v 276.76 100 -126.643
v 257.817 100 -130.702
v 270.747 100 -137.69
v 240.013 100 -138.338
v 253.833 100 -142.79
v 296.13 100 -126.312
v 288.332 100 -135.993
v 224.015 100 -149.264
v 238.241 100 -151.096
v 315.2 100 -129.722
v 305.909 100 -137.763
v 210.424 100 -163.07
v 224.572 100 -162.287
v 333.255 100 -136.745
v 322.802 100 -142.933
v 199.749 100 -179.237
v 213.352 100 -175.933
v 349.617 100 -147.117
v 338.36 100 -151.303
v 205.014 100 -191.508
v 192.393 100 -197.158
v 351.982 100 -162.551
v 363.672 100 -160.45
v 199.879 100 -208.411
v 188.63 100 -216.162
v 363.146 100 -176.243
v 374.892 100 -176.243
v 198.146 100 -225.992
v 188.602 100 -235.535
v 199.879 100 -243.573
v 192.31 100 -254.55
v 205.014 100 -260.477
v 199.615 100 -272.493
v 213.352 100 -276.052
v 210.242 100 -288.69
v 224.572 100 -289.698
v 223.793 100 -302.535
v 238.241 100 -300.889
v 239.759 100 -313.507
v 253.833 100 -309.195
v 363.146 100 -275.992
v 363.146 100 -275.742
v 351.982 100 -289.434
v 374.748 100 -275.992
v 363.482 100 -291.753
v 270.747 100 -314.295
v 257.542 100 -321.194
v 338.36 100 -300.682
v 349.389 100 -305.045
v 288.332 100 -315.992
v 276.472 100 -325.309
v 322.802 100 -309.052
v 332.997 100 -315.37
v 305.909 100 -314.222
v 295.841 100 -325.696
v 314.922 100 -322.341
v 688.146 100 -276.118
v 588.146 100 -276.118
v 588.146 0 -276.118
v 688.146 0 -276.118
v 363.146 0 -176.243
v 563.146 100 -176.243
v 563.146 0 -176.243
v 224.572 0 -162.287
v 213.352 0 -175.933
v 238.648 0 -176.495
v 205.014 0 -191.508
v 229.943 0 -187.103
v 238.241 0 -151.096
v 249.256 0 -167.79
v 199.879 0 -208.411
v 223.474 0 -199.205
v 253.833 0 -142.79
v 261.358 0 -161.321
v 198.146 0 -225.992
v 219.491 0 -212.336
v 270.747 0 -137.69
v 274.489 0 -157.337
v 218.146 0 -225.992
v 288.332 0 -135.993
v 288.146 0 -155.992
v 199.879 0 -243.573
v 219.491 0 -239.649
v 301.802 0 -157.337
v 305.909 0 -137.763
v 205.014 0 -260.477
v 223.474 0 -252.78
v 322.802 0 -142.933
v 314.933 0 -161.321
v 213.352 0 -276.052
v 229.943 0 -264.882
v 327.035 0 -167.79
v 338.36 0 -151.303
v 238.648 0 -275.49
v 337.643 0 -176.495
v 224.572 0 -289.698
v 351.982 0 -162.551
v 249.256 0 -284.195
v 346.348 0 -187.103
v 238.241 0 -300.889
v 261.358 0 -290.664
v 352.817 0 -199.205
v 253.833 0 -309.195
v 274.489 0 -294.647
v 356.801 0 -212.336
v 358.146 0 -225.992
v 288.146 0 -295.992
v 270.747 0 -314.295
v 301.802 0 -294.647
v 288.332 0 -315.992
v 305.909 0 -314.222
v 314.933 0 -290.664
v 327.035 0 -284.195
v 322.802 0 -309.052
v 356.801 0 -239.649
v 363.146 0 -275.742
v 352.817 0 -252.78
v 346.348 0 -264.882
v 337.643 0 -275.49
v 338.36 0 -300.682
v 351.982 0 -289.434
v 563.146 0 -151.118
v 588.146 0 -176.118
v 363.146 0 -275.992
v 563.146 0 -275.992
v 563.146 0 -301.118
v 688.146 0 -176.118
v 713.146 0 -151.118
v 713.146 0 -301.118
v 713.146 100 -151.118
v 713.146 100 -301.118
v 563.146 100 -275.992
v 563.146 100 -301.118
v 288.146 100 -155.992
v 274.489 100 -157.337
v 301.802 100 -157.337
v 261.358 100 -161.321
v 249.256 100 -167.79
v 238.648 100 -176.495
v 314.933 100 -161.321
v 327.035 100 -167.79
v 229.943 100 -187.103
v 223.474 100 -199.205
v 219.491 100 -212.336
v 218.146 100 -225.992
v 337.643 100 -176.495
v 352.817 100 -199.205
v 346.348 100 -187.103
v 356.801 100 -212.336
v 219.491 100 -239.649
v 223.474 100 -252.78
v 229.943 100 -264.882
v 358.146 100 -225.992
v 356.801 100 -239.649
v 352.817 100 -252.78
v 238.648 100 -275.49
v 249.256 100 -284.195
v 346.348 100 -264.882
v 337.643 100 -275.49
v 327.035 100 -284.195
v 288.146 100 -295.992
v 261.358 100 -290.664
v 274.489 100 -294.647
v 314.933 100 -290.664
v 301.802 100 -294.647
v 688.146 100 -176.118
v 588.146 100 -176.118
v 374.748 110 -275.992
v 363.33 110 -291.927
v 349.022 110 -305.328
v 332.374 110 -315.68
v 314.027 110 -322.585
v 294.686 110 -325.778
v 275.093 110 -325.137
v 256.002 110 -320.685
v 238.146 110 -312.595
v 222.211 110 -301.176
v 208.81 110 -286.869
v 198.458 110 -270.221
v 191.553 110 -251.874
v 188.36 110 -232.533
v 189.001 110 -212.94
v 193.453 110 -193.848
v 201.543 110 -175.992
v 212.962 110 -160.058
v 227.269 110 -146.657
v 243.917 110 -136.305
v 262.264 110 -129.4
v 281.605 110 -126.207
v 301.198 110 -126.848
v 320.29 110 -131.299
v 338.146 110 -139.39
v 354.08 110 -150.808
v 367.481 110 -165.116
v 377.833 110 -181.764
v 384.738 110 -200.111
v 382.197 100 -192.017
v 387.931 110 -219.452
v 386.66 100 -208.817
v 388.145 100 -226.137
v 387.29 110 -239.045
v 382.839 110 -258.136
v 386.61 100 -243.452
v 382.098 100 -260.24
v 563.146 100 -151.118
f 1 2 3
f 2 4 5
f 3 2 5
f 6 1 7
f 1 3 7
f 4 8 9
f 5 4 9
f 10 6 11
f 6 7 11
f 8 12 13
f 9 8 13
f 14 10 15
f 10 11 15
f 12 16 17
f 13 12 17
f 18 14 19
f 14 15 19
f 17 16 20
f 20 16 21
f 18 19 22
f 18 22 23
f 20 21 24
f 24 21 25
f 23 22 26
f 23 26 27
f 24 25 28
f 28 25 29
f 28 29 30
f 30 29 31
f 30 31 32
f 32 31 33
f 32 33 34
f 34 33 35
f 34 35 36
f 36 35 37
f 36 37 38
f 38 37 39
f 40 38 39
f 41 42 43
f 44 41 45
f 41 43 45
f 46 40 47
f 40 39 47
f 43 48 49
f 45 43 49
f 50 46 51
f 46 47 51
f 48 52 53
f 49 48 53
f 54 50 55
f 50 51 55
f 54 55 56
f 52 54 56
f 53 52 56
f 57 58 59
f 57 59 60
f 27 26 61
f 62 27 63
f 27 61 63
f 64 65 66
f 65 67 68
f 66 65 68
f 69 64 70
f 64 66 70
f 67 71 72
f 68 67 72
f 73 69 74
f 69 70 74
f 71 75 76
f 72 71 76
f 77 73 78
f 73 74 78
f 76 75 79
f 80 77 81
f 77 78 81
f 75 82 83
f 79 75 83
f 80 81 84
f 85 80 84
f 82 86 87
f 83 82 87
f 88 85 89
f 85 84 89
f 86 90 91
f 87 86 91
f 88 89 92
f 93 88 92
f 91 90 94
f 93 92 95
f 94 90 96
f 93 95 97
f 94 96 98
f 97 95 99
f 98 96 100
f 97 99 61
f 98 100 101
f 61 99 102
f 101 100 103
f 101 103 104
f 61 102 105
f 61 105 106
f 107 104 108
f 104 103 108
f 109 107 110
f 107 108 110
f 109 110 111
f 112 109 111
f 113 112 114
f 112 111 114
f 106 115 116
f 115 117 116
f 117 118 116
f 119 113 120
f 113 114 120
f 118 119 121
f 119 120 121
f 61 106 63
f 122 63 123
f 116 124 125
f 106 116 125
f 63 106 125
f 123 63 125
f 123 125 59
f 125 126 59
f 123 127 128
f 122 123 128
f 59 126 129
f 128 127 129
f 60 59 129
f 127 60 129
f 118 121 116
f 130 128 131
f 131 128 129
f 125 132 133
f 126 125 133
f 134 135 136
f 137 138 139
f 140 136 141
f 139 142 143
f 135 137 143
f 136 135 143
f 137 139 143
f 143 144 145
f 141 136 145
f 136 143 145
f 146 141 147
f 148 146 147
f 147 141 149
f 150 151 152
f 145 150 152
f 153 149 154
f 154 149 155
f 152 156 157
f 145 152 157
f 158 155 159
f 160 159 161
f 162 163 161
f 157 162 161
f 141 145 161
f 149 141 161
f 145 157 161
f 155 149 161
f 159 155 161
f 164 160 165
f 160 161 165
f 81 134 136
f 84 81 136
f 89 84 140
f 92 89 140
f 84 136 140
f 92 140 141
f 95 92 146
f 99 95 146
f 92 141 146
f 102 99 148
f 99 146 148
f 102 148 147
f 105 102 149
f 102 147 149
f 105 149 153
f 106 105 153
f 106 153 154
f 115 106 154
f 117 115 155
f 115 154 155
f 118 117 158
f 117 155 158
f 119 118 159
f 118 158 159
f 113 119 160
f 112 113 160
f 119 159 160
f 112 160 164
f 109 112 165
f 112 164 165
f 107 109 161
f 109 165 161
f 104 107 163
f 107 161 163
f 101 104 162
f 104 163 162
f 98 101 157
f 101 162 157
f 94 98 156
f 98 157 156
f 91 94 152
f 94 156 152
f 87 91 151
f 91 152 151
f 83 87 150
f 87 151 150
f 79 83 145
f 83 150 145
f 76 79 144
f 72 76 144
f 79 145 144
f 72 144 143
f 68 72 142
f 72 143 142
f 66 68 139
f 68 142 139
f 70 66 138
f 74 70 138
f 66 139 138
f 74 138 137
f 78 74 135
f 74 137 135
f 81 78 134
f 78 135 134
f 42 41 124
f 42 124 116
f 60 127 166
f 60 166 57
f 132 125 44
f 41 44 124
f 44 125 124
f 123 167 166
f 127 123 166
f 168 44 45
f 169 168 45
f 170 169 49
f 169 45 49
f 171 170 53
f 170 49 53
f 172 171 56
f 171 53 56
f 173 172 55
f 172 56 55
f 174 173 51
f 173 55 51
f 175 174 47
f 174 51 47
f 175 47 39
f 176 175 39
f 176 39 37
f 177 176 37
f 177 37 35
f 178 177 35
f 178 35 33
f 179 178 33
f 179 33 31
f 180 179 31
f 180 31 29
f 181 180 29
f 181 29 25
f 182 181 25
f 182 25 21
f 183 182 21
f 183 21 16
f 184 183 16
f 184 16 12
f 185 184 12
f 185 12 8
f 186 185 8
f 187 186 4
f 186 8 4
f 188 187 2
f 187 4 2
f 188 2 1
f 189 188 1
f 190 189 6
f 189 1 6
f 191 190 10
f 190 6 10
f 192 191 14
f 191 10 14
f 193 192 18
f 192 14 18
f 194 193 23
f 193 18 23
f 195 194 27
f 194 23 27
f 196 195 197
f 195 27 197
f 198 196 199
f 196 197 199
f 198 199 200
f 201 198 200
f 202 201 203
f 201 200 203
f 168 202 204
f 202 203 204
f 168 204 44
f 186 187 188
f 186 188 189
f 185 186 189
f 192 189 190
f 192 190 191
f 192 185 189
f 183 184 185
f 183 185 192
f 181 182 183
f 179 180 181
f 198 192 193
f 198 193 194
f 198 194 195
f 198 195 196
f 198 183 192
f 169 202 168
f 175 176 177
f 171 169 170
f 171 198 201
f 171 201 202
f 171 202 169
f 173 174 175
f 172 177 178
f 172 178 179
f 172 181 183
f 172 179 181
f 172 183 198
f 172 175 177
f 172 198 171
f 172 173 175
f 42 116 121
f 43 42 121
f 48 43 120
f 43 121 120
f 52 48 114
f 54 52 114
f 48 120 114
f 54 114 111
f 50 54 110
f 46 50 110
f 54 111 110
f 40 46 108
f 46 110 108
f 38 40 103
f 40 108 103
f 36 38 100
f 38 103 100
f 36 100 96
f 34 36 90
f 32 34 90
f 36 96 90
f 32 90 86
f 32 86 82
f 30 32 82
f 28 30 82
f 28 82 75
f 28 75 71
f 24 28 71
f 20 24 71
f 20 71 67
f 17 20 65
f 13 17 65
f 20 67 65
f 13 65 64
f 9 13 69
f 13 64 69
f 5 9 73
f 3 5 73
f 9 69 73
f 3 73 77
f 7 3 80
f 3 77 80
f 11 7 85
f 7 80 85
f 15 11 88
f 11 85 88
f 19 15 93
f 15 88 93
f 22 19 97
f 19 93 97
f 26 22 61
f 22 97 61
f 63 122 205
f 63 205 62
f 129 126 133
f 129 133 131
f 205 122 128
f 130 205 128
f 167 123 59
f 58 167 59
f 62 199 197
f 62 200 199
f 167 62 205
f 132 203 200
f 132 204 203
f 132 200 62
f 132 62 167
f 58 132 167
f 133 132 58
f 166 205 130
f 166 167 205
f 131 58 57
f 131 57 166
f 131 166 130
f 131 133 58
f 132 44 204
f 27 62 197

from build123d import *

# Parameters (mm, degrees)
SKETCH1_W           = 150
SKETCH1_H           = 150
BOSS_EXTRUDE1_DEPTH = 100
SKETCH5_R           = 70
CUT_EXTRUDE2_DEPTH  = 100
SKETCH6_R           = 100
BOSS_EXTRUDE4_DEPTH = 10
SKETCH7_W           = 100
SKETCH7_H           = 100
CUT_EXTRUDE3_DEPTH  = 100


with BuildPart() as part:
    # Sketch1 → Boss-Extrude1 (new body)
    with BuildSketch(Plane(origin=(0, 0, 0), x_dir=(1, 0, 0), z_dir=(0, 1, 0))):
        with BuildLine():
            Line((363.145565834, 275.992438563), (363.145565834, 275.741810419))
            ThreePointArc((363.145565834, 275.741810419), (198.145565834, 225.992438563), (363.145565834, 176.243066708))
            Line((363.145565834, 176.243066708), (563.145565834, 176.243066708))
            Line((563.145565834, 176.243066708), (563.145565834, 275.741810419))
            Line((563.145565834, 275.741810419), (563.145565834, 275.992438563))
            Line((563.145565834, 275.992438563), (363.145565834, 275.992438563))
        make_face()
        with Locations((638.145565834, 226.117752636)):
            Rectangle(SKETCH1_W, SKETCH1_H)
    extrude(amount=BOSS_EXTRUDE1_DEPTH)

    # Sketch5 → Cut-Extrude2 (cut)
    with BuildSketch(Plane(origin=(0, 100, 0), x_dir=(1, 0, 0), z_dir=(0, 1, 0))):
        with Locations(Location((288.145565834, 225.992438563, 0), (0, 0, 270))):
            Circle(SKETCH5_R)
    extrude(amount=-CUT_EXTRUDE2_DEPTH, mode=Mode.SUBTRACT)

    # Sketch6 → Boss-Extrude4 (add)
    with BuildSketch(Plane(origin=(0, 100, 0), x_dir=(1, 0, 0), z_dir=(0, 1, 0))):
        with Locations(Location((288.145565834, 225.992438563, 0), (0, 0, 30))):
            Circle(SKETCH6_R)
    extrude(amount=BOSS_EXTRUDE4_DEPTH)

    # Sketch7 → Cut-Extrude3 (cut)
    with BuildSketch(Plane(origin=(0, 100, 0), x_dir=(1, 0, 0), z_dir=(0, 1, 0))):
        with Locations((638.145565834, 226.117752636)):
            Rectangle(SKETCH7_W, SKETCH7_H)
    extrude(amount=-CUT_EXTRUDE3_DEPTH, mode=Mode.SUBTRACT)


solid = part.part
